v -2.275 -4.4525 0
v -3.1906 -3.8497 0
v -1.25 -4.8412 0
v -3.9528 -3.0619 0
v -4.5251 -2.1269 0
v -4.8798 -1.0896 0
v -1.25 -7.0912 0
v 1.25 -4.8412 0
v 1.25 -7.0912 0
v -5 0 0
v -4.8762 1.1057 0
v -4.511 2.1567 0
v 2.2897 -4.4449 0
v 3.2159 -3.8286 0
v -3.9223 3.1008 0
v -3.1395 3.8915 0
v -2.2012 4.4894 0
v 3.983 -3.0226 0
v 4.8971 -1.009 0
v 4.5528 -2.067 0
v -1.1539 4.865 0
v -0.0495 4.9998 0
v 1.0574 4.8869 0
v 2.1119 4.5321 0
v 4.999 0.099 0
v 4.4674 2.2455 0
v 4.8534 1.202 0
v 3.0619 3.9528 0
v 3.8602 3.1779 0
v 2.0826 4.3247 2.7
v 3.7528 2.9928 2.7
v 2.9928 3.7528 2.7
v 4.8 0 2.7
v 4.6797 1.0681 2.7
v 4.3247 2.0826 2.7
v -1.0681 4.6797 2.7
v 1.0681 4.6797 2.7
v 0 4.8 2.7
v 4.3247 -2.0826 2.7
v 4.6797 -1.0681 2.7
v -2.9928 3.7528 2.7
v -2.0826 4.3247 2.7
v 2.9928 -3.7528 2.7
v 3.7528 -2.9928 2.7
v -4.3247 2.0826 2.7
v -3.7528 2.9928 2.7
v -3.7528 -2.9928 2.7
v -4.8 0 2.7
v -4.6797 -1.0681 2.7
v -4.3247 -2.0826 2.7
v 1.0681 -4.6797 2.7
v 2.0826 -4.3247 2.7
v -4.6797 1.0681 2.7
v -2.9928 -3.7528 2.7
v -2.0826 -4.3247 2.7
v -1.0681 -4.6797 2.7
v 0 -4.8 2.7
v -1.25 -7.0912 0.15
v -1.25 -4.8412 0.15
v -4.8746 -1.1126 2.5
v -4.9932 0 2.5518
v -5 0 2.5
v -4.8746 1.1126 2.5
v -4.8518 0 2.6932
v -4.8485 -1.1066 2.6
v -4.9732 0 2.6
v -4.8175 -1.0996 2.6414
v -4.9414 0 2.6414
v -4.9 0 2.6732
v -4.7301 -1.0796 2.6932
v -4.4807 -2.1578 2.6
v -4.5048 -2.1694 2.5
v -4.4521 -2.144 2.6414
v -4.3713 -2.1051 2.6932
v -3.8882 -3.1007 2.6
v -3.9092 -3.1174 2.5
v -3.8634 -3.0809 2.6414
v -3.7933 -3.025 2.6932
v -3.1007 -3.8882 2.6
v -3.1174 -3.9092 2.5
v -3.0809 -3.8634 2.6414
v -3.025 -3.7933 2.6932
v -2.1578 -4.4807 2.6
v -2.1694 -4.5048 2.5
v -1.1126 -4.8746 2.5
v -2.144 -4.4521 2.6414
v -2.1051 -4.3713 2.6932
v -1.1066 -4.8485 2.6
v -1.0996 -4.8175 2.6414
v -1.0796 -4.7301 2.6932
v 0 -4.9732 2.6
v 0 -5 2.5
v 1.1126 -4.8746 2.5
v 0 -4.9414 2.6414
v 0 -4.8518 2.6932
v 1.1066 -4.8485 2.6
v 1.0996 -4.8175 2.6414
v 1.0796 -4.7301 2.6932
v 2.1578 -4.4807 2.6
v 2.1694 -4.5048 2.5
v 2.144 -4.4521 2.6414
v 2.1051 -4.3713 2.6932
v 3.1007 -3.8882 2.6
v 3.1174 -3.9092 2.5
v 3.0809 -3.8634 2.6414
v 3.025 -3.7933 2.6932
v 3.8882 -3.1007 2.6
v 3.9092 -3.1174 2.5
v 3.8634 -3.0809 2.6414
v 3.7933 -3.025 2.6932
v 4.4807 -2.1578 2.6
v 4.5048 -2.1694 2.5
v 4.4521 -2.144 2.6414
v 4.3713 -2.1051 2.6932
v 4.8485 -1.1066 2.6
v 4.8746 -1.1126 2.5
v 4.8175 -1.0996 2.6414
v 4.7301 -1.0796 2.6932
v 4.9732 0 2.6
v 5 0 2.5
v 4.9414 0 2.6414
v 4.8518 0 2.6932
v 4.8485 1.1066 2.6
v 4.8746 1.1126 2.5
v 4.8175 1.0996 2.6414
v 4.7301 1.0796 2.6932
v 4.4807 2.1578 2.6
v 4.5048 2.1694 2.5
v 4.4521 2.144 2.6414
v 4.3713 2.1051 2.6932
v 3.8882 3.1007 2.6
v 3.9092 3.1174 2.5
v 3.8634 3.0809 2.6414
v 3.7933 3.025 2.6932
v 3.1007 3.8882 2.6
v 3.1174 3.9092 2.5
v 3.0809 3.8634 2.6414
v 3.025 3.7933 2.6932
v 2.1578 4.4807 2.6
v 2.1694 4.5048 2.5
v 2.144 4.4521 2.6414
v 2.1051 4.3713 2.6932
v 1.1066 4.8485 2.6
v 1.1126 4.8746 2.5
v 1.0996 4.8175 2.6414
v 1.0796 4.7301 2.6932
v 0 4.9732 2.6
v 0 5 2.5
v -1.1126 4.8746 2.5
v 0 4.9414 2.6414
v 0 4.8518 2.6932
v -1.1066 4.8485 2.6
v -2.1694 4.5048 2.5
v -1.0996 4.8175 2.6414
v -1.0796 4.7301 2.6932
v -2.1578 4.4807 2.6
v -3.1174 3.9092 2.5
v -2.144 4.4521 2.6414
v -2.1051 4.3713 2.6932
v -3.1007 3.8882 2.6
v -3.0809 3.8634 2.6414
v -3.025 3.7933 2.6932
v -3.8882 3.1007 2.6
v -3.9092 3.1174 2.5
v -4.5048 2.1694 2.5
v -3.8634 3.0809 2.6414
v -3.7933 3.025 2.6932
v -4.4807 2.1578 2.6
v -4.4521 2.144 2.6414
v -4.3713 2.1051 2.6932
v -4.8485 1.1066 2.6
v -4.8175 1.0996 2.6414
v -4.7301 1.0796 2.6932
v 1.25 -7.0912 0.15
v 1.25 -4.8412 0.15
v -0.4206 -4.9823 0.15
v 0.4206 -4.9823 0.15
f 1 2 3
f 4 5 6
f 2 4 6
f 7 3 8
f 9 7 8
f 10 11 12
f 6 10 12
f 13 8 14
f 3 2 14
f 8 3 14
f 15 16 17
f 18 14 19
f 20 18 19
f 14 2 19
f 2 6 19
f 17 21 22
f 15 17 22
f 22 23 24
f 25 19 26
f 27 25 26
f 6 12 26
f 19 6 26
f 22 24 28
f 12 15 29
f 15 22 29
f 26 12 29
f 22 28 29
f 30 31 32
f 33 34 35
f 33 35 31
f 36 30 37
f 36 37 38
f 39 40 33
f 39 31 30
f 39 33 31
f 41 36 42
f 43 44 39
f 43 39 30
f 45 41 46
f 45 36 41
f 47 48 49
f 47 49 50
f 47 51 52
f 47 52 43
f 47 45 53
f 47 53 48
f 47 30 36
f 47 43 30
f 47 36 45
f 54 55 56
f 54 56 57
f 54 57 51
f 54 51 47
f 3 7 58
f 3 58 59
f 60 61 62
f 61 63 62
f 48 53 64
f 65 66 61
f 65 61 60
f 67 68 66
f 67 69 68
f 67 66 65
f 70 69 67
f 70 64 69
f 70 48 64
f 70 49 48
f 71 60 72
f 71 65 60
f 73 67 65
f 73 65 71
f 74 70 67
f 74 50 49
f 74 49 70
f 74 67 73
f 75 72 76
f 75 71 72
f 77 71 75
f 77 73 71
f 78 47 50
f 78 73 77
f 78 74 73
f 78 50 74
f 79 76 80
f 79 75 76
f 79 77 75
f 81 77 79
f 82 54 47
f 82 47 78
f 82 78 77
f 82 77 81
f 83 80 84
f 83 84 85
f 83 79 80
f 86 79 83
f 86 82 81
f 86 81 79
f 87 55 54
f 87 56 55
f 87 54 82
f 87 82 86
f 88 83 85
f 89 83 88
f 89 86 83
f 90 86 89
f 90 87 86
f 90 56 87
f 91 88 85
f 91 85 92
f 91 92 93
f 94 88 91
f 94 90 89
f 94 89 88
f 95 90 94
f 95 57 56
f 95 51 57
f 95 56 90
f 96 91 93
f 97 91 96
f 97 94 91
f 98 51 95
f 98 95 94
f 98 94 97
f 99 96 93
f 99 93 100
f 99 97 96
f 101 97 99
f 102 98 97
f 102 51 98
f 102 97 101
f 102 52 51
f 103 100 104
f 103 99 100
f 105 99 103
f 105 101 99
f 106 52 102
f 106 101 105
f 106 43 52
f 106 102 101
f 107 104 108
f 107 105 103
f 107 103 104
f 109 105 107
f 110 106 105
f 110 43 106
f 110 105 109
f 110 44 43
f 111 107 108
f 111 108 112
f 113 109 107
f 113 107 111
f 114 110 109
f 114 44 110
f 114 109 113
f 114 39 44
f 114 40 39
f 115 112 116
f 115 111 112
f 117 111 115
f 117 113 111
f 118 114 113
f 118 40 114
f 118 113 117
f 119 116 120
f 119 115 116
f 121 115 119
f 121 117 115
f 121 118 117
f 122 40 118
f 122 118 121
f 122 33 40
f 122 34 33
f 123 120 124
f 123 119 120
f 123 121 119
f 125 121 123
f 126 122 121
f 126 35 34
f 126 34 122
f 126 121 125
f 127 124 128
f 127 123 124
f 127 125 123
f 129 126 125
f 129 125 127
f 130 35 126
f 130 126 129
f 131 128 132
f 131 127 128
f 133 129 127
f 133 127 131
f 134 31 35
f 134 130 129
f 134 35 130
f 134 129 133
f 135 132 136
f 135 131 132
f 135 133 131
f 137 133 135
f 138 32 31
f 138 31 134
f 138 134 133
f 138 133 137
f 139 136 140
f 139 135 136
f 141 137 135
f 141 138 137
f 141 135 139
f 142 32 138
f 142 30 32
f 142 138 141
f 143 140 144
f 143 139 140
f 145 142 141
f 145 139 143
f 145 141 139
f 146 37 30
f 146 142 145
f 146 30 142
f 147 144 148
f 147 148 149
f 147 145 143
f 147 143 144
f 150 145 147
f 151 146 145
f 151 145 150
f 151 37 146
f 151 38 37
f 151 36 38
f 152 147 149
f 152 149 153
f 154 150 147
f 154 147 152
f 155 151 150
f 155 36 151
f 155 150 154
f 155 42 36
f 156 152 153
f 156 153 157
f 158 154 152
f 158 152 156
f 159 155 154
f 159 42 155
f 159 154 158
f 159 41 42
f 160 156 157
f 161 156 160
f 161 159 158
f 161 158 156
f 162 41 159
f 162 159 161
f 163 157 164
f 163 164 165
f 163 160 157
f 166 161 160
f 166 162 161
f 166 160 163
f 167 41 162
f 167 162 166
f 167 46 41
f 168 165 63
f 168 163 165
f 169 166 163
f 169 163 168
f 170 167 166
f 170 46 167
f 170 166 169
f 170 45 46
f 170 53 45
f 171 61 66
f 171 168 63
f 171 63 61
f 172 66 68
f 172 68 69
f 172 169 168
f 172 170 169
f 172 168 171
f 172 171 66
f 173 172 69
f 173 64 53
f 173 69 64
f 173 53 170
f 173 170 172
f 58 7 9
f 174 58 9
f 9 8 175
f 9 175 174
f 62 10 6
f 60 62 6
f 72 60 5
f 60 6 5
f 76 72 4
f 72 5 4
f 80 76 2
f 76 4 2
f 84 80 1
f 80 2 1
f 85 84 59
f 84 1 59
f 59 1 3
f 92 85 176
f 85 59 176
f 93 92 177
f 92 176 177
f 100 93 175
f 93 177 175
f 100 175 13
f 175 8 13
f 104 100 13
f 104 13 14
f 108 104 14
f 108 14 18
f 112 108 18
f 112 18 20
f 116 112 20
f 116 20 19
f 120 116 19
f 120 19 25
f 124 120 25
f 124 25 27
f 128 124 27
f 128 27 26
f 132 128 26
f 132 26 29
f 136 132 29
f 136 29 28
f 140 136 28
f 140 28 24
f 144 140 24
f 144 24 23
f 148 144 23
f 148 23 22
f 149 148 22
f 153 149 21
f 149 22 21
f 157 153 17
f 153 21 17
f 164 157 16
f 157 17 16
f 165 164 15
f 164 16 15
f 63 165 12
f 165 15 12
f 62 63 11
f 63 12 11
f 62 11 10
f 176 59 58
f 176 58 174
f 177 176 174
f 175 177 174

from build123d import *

# Parameters (mm, degrees)
SKETCH1_R           = 5
BOSS_EXTRUDE1_DEPTH = 2.7
BOSS_EXTRUDE2_DEPTH = 0.15
FILLET2_R           = 0.2


with BuildPart() as part:
    # Sketch1 → Boss-Extrude1 (new body)
    with BuildSketch(Plane.XY):
        Circle(SKETCH1_R)
    extrude(amount=BOSS_EXTRUDE1_DEPTH)

    # Sketch3 → Boss-Extrude2 (add)
    with BuildSketch(Plane(origin=(0, 0, 0), x_dir=(-1, 0, 0), z_dir=(0, 0, -1))):
        Polygon((1.25, -4.841229183), (1.25, -7.091229183), (-1.25, -7.091229183), (-1.25, -4.841229183), (-1.25, -4.179733262), (1.25, -4.179733262), align=None)
    extrude(amount=-BOSS_EXTRUDE2_DEPTH)

    # Fillet2
    fillet2_edges = [part.edges().sort_by_distance(p)[0] for p in [
        (-5, 0, 2.7),
    ]]
    fillet(fillet2_edges, radius=FILLET2_R)


solid = part.part
